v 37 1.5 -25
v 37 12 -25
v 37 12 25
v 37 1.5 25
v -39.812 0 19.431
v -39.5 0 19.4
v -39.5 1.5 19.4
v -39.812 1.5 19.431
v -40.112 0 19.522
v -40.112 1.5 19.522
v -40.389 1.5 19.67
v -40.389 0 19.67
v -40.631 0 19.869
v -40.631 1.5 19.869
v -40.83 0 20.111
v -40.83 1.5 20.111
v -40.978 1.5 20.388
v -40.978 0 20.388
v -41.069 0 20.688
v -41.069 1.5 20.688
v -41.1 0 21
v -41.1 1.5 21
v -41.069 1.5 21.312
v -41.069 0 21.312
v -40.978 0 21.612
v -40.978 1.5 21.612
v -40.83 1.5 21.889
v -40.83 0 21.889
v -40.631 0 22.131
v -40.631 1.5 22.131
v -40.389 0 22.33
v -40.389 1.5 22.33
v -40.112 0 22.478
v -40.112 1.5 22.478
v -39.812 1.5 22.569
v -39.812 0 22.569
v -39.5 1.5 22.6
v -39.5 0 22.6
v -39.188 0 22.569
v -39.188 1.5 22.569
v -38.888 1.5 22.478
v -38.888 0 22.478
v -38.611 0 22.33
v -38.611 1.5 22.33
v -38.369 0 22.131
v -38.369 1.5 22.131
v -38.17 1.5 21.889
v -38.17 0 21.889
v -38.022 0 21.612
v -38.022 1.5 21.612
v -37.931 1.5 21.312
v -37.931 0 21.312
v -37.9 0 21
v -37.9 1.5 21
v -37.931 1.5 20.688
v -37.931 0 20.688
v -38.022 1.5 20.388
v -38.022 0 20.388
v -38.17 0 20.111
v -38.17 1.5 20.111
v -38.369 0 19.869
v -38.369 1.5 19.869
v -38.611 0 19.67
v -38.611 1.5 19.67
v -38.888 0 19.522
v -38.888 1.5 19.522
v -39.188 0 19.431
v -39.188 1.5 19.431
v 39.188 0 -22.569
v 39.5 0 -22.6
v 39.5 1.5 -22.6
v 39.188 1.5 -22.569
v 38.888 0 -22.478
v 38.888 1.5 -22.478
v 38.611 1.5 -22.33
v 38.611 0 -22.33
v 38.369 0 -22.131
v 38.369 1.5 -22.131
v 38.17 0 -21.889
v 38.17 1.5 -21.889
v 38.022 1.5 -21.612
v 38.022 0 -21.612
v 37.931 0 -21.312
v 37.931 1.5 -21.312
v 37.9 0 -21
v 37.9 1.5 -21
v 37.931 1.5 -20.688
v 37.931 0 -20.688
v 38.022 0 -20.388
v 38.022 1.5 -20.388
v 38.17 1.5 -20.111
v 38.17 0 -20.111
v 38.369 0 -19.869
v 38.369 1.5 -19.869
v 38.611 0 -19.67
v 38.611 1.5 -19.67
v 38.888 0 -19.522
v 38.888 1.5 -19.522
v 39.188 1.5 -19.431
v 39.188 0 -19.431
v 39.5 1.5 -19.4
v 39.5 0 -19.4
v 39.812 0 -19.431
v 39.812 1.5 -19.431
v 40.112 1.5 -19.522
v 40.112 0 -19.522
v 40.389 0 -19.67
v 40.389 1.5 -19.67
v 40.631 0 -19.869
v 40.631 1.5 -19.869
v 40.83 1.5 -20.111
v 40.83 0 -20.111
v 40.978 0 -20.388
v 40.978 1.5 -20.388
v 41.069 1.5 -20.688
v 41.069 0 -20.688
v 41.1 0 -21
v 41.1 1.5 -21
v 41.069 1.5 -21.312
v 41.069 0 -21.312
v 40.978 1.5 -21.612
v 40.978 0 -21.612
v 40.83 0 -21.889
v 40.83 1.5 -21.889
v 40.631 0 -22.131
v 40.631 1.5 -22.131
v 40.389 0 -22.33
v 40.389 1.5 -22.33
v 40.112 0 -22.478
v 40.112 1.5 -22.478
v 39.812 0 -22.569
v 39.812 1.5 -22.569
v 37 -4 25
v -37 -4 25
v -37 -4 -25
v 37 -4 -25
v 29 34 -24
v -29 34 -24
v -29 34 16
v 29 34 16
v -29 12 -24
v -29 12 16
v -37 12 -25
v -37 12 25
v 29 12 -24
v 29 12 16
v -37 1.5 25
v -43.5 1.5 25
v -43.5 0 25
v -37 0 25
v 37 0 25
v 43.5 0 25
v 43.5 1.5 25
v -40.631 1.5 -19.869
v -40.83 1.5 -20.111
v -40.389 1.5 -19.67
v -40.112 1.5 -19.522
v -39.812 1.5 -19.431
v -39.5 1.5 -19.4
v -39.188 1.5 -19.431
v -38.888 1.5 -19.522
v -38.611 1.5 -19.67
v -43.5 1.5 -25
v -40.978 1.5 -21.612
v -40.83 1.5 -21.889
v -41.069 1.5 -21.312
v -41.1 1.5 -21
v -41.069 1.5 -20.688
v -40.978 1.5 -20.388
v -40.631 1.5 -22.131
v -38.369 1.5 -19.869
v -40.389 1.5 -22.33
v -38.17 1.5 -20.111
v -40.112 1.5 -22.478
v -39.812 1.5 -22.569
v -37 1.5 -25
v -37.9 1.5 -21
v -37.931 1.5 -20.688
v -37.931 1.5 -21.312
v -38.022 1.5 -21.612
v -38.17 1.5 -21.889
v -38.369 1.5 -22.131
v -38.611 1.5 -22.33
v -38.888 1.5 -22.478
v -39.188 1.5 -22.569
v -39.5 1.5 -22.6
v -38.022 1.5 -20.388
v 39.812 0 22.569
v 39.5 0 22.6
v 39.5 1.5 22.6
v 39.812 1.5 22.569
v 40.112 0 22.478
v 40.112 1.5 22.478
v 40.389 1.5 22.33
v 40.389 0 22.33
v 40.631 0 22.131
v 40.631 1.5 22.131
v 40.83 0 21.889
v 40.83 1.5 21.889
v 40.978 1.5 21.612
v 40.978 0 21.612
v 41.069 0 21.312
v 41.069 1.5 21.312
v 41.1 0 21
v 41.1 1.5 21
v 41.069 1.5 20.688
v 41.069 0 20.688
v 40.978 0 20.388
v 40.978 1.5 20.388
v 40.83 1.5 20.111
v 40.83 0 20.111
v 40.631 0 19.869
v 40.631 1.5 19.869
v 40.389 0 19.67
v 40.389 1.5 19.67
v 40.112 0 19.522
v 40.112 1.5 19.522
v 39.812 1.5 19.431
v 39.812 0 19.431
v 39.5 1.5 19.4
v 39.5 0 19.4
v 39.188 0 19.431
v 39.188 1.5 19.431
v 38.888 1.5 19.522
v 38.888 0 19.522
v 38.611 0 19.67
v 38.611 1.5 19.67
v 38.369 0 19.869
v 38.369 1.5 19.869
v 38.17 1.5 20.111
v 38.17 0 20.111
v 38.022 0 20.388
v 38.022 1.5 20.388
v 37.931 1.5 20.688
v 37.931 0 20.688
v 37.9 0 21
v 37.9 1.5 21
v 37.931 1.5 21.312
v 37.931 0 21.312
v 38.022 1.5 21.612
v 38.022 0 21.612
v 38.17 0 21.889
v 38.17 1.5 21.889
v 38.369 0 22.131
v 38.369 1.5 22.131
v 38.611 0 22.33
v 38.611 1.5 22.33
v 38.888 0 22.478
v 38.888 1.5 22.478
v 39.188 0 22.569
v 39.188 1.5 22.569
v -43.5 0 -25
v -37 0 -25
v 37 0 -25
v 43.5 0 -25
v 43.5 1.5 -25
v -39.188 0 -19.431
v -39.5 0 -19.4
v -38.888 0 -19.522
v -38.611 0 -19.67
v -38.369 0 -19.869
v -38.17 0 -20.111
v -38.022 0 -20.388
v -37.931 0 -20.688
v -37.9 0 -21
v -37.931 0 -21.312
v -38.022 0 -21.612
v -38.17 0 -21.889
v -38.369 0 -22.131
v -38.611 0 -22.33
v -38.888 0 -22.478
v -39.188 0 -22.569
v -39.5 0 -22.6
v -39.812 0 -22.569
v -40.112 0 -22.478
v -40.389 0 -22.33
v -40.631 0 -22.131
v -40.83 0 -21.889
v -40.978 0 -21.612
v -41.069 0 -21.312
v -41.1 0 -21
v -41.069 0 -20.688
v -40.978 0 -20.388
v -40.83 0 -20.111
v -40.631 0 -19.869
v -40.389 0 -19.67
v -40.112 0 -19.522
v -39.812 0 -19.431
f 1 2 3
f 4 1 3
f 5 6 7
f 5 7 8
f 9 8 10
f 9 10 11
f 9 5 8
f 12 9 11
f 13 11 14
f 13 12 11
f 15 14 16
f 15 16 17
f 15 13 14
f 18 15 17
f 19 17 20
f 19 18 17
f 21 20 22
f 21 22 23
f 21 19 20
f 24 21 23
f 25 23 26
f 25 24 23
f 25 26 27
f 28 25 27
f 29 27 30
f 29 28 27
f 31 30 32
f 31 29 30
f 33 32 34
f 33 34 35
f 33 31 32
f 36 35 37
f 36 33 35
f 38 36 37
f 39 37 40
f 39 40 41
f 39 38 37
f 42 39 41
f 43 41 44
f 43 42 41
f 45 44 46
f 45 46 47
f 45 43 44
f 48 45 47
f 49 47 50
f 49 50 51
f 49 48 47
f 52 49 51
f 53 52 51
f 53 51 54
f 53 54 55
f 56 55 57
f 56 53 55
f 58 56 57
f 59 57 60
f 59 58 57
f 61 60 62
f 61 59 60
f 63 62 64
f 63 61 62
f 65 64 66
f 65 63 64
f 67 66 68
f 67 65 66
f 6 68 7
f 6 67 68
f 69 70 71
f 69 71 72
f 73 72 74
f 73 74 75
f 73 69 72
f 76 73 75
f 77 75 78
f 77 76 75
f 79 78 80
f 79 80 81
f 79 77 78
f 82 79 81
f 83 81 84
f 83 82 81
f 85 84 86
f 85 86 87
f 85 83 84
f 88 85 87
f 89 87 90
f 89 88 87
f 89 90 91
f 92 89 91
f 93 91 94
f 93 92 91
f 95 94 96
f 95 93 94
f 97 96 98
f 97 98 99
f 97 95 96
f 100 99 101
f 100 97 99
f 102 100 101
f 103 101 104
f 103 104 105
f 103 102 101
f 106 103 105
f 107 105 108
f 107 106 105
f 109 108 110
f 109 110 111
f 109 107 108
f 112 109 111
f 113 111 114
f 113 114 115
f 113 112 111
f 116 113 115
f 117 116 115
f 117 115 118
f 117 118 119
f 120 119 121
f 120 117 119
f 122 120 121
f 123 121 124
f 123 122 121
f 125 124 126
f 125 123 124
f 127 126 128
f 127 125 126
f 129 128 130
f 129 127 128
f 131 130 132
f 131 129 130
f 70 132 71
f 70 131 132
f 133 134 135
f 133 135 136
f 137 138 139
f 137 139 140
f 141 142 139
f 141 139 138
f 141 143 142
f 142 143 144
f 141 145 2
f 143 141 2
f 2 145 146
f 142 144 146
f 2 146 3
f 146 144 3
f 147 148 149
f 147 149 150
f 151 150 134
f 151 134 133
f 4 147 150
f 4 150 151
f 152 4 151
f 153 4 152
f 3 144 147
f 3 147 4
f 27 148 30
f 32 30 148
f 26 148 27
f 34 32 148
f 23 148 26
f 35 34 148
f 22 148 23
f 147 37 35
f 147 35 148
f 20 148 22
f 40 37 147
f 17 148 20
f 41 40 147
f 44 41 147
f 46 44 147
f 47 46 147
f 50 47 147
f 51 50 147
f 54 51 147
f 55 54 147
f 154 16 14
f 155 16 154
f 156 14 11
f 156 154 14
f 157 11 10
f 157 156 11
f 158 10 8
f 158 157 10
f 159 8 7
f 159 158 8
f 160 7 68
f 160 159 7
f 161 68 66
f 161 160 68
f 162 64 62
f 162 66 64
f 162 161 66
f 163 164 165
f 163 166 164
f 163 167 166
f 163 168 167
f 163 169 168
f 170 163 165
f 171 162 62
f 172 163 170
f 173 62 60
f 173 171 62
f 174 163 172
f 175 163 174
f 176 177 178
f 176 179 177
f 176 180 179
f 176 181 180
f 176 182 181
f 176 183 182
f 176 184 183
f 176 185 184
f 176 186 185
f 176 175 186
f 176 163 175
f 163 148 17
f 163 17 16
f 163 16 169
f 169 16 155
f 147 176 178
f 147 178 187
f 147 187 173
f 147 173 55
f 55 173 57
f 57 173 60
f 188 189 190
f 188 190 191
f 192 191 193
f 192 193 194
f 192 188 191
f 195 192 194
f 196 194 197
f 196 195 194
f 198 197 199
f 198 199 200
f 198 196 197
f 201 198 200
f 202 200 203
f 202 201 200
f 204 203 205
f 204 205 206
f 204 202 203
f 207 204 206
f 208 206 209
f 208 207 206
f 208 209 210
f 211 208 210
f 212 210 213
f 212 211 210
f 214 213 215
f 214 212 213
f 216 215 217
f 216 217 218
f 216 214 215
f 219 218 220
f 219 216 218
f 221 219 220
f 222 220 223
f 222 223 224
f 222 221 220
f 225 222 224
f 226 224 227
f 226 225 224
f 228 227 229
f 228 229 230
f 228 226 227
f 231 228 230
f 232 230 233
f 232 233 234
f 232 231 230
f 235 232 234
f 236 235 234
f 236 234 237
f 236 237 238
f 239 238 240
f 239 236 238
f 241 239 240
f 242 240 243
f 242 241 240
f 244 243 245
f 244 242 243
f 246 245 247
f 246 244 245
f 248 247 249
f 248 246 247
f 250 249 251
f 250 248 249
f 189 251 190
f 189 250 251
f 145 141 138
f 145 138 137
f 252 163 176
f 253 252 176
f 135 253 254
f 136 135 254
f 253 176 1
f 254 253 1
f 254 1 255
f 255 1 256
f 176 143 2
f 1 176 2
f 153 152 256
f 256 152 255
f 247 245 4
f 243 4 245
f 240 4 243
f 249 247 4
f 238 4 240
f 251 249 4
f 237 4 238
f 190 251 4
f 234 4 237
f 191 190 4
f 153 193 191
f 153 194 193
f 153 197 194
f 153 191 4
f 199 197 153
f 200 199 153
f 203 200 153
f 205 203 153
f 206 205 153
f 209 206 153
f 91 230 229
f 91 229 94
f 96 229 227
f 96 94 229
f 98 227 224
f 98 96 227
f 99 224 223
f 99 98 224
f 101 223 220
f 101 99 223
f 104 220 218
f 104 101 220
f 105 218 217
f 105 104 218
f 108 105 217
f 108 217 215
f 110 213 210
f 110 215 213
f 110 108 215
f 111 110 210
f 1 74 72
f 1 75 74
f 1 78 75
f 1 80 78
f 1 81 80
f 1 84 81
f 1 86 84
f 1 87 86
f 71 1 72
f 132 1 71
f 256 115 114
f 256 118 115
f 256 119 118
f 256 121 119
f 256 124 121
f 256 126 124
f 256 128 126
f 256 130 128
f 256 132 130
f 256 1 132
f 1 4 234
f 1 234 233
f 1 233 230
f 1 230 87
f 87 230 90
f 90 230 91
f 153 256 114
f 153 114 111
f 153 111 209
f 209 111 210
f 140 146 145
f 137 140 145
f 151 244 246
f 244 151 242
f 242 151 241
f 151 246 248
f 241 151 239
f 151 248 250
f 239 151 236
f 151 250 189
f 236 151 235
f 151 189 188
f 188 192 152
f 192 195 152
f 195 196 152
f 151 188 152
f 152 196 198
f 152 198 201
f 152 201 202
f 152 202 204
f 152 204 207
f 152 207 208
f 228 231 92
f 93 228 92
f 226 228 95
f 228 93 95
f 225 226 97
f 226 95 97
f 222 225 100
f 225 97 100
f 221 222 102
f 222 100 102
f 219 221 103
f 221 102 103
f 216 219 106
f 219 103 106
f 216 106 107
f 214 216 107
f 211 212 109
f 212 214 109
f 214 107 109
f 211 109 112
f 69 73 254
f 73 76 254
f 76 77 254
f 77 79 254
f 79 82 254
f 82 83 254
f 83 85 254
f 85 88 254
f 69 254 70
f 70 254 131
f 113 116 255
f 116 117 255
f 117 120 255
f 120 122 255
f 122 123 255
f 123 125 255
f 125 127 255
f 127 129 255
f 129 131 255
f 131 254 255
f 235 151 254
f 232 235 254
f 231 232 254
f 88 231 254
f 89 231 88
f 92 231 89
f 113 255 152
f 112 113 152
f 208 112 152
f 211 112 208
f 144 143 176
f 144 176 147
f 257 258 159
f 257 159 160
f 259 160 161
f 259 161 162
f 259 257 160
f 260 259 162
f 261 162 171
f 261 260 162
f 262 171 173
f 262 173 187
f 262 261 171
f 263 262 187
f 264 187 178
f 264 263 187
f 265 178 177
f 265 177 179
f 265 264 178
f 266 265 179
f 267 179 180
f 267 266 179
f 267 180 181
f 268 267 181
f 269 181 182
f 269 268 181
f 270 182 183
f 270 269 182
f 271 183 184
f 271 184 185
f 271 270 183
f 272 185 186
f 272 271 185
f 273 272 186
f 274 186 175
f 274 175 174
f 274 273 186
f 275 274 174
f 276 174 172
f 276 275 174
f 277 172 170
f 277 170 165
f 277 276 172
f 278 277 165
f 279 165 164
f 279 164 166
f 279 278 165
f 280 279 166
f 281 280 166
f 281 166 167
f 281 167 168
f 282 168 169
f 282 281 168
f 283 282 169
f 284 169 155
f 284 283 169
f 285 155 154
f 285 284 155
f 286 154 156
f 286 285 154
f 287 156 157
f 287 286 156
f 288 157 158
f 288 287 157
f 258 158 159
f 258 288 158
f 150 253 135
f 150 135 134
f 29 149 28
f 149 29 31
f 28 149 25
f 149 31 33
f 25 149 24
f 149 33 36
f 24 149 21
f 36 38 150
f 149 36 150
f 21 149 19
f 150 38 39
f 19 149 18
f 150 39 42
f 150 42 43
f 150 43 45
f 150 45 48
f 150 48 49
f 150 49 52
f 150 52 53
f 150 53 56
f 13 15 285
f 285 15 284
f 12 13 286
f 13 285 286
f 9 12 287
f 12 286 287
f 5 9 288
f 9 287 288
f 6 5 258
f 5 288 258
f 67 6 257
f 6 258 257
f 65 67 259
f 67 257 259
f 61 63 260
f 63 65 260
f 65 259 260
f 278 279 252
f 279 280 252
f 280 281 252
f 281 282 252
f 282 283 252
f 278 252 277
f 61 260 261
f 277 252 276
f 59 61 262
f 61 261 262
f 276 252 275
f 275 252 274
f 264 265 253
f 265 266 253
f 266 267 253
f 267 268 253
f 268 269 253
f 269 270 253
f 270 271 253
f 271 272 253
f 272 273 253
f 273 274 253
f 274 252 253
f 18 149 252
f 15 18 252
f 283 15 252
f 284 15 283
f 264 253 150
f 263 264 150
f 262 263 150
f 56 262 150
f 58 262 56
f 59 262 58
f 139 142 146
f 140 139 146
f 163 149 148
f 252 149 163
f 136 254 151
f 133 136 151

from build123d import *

# Parameters (mm, degrees)
SKETCH_1_W           = 87
SKETCH_1_H           = 50
SKETCH_1_R           = 1.6
EXTRUDE_1_DEPTH      = 1.5
EXTRUDE_2_DEPTH      = 4
EXTRUDE_2_DEPTH_BACK = 12
SKETCH_2_W           = 74
SKETCH_2_H           = 50
SKETCH_3_W           = 58
SKETCH_3_H           = 40
EXTRUDE_3_DEPTH      = 22


with BuildPart() as part:
    # 草图1 → 凸台-拉伸1 (new body)
    with BuildSketch(Plane(origin=(0, 0, 0), x_dir=(1, 0, 0), z_dir=(0, 1, 0))):
        Rectangle(SKETCH_1_W, SKETCH_1_H)
        with Locations(Location((-39.5, 21, 0), (0, 0, 270))):
            Circle(SKETCH_1_R, mode=Mode.SUBTRACT)
        with Locations(Location((-39.5, -21, 0), (0, 0, 90))):
            Circle(SKETCH_1_R, mode=Mode.SUBTRACT)
        with Locations(Location((39.5, -21, 0), (0, 0, 270))):
            Circle(SKETCH_1_R, mode=Mode.SUBTRACT)
        with Locations(Location((39.5, 21, 0), (0, 0, 90))):
            Circle(SKETCH_1_R, mode=Mode.SUBTRACT)
    extrude(amount=EXTRUDE_1_DEPTH)

    # 草图2 → 凸台-拉伸2 (add, two sides: drawn at the far end of the back side and taken through both)
    with BuildSketch(Plane.XZ.offset(-EXTRUDE_2_DEPTH_BACK)):
        Rectangle(SKETCH_2_W, SKETCH_2_H)
    extrude(amount=EXTRUDE_2_DEPTH + EXTRUDE_2_DEPTH_BACK)

    # 草图3 → 凸台-拉伸3 (add)
    with BuildSketch(Plane(origin=(0, 12, 0), x_dir=(1, 0, 0), z_dir=(0, 1, 0))):
        with Locations((0, 4)):
            Rectangle(SKETCH_3_W, SKETCH_3_H)
    extrude(amount=EXTRUDE_3_DEPTH)


solid = part.part
